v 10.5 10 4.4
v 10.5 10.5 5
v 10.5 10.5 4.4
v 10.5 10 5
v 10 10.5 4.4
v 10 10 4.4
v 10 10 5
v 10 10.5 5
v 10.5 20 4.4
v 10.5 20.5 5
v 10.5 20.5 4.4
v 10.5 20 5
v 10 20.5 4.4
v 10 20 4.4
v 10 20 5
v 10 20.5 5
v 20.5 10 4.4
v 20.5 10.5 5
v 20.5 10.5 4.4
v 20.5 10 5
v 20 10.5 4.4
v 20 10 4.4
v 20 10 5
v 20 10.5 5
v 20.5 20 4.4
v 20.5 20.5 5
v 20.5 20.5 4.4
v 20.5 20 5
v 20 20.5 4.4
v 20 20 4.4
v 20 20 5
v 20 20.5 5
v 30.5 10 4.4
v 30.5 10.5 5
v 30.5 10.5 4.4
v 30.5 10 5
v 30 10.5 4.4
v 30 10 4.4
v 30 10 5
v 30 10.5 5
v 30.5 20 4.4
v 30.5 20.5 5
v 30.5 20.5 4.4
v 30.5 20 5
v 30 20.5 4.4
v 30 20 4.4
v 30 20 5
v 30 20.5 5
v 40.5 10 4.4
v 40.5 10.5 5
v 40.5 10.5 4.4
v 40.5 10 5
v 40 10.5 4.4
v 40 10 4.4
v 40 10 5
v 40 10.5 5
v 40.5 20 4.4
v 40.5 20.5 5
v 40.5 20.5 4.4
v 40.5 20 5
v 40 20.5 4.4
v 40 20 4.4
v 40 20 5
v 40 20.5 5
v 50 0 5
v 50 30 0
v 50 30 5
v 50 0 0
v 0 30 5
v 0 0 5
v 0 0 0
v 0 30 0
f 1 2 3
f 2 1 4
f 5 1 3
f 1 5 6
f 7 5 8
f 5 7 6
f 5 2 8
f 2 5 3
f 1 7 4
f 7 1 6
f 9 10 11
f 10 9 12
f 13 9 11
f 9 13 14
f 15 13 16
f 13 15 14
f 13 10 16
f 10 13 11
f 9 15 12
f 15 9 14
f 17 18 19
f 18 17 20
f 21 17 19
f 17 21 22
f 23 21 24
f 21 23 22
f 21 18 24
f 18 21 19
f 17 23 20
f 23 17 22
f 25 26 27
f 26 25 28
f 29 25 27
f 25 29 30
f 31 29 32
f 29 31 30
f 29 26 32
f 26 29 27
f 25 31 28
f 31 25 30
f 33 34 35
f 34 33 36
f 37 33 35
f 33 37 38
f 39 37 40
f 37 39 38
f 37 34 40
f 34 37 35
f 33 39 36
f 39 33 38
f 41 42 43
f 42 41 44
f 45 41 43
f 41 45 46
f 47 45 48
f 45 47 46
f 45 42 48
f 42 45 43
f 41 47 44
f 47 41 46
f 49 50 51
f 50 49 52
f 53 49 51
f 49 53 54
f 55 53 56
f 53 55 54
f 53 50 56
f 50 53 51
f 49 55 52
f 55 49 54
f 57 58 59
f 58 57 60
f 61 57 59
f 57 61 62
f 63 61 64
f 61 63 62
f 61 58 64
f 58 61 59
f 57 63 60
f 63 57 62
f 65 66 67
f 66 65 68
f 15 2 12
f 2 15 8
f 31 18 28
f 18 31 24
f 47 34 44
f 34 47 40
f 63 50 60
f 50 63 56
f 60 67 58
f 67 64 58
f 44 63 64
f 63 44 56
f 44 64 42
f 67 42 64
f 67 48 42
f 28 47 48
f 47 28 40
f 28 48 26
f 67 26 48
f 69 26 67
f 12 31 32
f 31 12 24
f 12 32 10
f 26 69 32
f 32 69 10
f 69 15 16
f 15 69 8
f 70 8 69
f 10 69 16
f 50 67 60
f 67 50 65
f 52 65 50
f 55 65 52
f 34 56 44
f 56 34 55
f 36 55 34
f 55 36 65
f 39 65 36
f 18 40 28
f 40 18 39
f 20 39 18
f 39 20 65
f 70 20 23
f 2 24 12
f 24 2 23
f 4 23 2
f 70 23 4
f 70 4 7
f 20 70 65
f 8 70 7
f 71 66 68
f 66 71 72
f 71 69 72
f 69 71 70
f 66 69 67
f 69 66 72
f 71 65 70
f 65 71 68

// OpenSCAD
/**
Title: Needle Holder
Description: Holder for 24ga needles
Designer: Nam Tran
Units: mm
Last Modified: 2022-07-10
*/

/*[ Well Values] */
well_depth = 0.6; // .1
// Depth adjustment from "true" value
depth_tolerance = 0.0; // .1
well_diameter = 0.5; // .1
// Diameter adjustment from "true" value
diameter_tolerance = 0.0; // .1

/* [Base Values] */
wells_per_row = 4; // [1:10]
wells_per_column = 2; // [1:10]
distance_between_wells = 10.0; // .1
base_height = 5.0; // .1

module base() {
    cube([((wells_per_row + 1) * distance_between_wells), ((wells_per_column + 1) * distance_between_wells), base_height]);
}

module wells() {
    for (i = [0:(wells_per_row - 1)]) {
        for (j = [0:(wells_per_column - 1)]) {
            translate([distance_between_wells+(distance_between_wells * i), distance_between_wells+(distance_between_wells * j), (base_height - well_depth)])
            //cylinder(h=(well_depth + 0.1), r=well_diameter, $fn=360);
            cube([(well_diameter + diameter_tolerance), (well_diameter + diameter_tolerance), (well_depth + depth_tolerance + 0.1)]);
        }
    }
}

difference() {
    base();
    wells();
}
